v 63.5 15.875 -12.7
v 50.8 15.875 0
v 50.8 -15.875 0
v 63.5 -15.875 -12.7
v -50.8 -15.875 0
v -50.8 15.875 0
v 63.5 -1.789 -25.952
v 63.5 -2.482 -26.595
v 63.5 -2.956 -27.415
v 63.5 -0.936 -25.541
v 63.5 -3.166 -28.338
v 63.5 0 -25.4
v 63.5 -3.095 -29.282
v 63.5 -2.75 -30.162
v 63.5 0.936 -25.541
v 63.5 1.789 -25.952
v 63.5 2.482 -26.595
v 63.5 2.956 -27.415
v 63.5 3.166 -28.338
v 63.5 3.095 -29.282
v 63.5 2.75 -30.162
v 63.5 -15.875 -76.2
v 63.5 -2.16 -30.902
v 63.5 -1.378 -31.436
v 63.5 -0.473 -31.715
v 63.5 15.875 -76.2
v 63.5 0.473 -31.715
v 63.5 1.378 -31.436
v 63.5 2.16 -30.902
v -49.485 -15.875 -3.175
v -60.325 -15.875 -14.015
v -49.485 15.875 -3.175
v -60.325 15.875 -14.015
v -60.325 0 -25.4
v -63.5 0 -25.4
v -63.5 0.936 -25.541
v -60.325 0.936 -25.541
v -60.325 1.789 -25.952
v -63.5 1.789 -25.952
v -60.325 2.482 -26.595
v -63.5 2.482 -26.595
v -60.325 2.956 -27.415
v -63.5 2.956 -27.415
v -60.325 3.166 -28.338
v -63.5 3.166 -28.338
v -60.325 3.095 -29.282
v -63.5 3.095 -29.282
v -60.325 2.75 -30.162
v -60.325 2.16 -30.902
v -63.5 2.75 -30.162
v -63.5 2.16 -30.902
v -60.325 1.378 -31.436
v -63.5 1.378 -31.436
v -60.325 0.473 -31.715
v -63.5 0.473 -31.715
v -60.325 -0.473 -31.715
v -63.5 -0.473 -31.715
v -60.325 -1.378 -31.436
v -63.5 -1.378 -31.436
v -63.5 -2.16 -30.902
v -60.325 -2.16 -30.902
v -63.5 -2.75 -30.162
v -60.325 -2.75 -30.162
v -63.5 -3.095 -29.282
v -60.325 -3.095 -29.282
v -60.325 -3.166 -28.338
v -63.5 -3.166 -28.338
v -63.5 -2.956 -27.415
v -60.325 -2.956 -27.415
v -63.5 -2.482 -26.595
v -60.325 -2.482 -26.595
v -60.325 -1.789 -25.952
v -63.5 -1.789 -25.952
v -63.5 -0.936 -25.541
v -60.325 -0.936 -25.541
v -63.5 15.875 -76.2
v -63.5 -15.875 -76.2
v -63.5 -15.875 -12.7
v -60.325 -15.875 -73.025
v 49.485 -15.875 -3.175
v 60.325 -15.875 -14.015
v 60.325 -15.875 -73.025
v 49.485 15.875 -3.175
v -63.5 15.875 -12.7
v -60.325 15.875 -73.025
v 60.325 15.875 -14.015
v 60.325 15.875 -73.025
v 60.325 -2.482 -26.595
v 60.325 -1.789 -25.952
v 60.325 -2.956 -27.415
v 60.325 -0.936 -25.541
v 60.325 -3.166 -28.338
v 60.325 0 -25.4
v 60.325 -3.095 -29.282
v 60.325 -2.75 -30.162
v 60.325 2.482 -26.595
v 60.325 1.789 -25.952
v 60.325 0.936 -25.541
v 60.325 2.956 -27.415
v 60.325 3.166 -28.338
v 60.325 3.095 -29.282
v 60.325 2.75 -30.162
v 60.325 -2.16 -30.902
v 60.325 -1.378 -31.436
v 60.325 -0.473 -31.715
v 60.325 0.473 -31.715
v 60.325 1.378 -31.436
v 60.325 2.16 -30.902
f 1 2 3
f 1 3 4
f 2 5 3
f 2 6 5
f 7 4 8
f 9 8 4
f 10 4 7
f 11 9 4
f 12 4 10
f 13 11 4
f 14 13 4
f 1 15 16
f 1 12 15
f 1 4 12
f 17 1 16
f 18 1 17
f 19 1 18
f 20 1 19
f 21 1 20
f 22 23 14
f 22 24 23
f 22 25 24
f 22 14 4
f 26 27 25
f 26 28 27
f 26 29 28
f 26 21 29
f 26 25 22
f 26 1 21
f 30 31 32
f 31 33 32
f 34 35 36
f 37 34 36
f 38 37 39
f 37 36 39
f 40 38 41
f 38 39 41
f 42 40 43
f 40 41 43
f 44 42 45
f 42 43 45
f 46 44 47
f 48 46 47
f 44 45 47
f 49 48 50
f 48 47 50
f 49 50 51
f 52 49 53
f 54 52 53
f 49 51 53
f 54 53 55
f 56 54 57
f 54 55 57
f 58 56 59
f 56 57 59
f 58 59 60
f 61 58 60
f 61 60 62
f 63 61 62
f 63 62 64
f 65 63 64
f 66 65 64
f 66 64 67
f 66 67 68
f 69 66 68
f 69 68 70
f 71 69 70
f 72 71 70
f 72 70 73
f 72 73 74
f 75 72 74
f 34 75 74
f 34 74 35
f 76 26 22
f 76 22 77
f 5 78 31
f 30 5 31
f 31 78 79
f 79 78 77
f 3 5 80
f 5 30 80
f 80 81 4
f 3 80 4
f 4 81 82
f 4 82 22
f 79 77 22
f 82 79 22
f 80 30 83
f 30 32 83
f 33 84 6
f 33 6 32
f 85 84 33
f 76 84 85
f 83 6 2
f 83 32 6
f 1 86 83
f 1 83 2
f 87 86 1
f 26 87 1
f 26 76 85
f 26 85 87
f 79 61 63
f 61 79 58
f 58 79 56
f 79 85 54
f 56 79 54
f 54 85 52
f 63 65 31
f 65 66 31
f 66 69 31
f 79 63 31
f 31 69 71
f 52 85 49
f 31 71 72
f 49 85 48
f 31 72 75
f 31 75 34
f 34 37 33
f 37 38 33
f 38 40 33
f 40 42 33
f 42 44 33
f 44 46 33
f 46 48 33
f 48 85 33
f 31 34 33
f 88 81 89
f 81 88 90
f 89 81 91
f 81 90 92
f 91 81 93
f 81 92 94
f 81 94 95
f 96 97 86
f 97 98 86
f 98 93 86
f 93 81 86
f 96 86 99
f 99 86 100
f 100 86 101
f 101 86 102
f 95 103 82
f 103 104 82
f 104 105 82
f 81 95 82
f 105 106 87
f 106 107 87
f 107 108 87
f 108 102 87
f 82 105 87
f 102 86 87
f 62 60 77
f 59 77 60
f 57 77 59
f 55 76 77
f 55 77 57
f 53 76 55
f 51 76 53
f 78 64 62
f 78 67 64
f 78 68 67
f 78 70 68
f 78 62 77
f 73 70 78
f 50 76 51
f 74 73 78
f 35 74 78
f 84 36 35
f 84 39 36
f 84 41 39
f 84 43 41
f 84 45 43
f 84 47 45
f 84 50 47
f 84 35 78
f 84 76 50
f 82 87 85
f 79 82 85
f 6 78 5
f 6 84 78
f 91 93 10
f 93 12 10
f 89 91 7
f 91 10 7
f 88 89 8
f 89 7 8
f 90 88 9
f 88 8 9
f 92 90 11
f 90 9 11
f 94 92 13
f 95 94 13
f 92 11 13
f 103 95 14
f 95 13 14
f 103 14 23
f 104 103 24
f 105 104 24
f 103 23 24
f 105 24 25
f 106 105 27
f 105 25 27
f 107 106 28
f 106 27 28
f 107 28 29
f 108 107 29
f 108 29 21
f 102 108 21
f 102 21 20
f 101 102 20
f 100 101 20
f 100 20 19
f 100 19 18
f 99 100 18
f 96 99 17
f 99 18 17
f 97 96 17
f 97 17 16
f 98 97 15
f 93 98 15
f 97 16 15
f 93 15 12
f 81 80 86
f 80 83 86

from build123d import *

# Parameters (mm, degrees)
BOSS_EXTRUDE1_DEPTH = 15.875
CUT_EXTRUDE1_REACH  = 150.955
SKETCH2_R           = 3.175
CUT_EXTRUDE2_REACH  = 150.955
SKETCH3_R           = 3.175


with BuildPart() as part:
    # Sketch1 → Boss-Extrude1 (new, symmetric)
    with BuildSketch(Plane(origin=(0, 0, 0), x_dir=(1, 0, 0), z_dir=(0, 1, 0))):
        Polygon((-50.8, 0), (50.8, 0), (63.5, 12.7), (63.5, 76.2), (-63.5, 76.2), (-63.5, 12.7), align=None)
        Polygon((60.325, 73.025), (-60.325, 73.025), (-60.325, 14.015128061), (-49.484871939, 3.175), (49.484871939, 3.175), (60.325, 14.015128061), align=None, mode=Mode.SUBTRACT)
    extrude(amount=BOSS_EXTRUDE1_DEPTH, both=True)

    # Sketch2 → Cut-Extrude1 (cut, up to next)
    with BuildSketch(Plane.ZY.offset(63.5), mode=Mode.PRIVATE) as cut_extrude1_sk1:
        with Locations((-28.575, 0)):
            Circle(SKETCH2_R)
    cut_extrude1_tool1 = extrude(cut_extrude1_sk1.sketch, amount=-CUT_EXTRUDE1_REACH, mode=Mode.PRIVATE) & part.part
    add(cut_extrude1_tool1.solids().sort_by_distance((-63.5, 0, -28.575))[0], mode=Mode.SUBTRACT)

    # Sketch3 → Cut-Extrude2 (cut, up to next)
    with BuildSketch(Plane(origin=(63.5, 0, 0), x_dir=(0, 0, -1), z_dir=(1, 0, 0)), mode=Mode.PRIVATE) as cut_extrude2_sk1:
        with Locations(Location((28.575, 0, 0), (0, 0, 180))):
            Circle(SKETCH3_R)
    cut_extrude2_tool1 = extrude(cut_extrude2_sk1.sketch, amount=-CUT_EXTRUDE2_REACH, mode=Mode.PRIVATE) & part.part
    add(cut_extrude2_tool1.solids().sort_by_distance((63.5, 0, -28.575))[0], mode=Mode.SUBTRACT)


solid = part.part
